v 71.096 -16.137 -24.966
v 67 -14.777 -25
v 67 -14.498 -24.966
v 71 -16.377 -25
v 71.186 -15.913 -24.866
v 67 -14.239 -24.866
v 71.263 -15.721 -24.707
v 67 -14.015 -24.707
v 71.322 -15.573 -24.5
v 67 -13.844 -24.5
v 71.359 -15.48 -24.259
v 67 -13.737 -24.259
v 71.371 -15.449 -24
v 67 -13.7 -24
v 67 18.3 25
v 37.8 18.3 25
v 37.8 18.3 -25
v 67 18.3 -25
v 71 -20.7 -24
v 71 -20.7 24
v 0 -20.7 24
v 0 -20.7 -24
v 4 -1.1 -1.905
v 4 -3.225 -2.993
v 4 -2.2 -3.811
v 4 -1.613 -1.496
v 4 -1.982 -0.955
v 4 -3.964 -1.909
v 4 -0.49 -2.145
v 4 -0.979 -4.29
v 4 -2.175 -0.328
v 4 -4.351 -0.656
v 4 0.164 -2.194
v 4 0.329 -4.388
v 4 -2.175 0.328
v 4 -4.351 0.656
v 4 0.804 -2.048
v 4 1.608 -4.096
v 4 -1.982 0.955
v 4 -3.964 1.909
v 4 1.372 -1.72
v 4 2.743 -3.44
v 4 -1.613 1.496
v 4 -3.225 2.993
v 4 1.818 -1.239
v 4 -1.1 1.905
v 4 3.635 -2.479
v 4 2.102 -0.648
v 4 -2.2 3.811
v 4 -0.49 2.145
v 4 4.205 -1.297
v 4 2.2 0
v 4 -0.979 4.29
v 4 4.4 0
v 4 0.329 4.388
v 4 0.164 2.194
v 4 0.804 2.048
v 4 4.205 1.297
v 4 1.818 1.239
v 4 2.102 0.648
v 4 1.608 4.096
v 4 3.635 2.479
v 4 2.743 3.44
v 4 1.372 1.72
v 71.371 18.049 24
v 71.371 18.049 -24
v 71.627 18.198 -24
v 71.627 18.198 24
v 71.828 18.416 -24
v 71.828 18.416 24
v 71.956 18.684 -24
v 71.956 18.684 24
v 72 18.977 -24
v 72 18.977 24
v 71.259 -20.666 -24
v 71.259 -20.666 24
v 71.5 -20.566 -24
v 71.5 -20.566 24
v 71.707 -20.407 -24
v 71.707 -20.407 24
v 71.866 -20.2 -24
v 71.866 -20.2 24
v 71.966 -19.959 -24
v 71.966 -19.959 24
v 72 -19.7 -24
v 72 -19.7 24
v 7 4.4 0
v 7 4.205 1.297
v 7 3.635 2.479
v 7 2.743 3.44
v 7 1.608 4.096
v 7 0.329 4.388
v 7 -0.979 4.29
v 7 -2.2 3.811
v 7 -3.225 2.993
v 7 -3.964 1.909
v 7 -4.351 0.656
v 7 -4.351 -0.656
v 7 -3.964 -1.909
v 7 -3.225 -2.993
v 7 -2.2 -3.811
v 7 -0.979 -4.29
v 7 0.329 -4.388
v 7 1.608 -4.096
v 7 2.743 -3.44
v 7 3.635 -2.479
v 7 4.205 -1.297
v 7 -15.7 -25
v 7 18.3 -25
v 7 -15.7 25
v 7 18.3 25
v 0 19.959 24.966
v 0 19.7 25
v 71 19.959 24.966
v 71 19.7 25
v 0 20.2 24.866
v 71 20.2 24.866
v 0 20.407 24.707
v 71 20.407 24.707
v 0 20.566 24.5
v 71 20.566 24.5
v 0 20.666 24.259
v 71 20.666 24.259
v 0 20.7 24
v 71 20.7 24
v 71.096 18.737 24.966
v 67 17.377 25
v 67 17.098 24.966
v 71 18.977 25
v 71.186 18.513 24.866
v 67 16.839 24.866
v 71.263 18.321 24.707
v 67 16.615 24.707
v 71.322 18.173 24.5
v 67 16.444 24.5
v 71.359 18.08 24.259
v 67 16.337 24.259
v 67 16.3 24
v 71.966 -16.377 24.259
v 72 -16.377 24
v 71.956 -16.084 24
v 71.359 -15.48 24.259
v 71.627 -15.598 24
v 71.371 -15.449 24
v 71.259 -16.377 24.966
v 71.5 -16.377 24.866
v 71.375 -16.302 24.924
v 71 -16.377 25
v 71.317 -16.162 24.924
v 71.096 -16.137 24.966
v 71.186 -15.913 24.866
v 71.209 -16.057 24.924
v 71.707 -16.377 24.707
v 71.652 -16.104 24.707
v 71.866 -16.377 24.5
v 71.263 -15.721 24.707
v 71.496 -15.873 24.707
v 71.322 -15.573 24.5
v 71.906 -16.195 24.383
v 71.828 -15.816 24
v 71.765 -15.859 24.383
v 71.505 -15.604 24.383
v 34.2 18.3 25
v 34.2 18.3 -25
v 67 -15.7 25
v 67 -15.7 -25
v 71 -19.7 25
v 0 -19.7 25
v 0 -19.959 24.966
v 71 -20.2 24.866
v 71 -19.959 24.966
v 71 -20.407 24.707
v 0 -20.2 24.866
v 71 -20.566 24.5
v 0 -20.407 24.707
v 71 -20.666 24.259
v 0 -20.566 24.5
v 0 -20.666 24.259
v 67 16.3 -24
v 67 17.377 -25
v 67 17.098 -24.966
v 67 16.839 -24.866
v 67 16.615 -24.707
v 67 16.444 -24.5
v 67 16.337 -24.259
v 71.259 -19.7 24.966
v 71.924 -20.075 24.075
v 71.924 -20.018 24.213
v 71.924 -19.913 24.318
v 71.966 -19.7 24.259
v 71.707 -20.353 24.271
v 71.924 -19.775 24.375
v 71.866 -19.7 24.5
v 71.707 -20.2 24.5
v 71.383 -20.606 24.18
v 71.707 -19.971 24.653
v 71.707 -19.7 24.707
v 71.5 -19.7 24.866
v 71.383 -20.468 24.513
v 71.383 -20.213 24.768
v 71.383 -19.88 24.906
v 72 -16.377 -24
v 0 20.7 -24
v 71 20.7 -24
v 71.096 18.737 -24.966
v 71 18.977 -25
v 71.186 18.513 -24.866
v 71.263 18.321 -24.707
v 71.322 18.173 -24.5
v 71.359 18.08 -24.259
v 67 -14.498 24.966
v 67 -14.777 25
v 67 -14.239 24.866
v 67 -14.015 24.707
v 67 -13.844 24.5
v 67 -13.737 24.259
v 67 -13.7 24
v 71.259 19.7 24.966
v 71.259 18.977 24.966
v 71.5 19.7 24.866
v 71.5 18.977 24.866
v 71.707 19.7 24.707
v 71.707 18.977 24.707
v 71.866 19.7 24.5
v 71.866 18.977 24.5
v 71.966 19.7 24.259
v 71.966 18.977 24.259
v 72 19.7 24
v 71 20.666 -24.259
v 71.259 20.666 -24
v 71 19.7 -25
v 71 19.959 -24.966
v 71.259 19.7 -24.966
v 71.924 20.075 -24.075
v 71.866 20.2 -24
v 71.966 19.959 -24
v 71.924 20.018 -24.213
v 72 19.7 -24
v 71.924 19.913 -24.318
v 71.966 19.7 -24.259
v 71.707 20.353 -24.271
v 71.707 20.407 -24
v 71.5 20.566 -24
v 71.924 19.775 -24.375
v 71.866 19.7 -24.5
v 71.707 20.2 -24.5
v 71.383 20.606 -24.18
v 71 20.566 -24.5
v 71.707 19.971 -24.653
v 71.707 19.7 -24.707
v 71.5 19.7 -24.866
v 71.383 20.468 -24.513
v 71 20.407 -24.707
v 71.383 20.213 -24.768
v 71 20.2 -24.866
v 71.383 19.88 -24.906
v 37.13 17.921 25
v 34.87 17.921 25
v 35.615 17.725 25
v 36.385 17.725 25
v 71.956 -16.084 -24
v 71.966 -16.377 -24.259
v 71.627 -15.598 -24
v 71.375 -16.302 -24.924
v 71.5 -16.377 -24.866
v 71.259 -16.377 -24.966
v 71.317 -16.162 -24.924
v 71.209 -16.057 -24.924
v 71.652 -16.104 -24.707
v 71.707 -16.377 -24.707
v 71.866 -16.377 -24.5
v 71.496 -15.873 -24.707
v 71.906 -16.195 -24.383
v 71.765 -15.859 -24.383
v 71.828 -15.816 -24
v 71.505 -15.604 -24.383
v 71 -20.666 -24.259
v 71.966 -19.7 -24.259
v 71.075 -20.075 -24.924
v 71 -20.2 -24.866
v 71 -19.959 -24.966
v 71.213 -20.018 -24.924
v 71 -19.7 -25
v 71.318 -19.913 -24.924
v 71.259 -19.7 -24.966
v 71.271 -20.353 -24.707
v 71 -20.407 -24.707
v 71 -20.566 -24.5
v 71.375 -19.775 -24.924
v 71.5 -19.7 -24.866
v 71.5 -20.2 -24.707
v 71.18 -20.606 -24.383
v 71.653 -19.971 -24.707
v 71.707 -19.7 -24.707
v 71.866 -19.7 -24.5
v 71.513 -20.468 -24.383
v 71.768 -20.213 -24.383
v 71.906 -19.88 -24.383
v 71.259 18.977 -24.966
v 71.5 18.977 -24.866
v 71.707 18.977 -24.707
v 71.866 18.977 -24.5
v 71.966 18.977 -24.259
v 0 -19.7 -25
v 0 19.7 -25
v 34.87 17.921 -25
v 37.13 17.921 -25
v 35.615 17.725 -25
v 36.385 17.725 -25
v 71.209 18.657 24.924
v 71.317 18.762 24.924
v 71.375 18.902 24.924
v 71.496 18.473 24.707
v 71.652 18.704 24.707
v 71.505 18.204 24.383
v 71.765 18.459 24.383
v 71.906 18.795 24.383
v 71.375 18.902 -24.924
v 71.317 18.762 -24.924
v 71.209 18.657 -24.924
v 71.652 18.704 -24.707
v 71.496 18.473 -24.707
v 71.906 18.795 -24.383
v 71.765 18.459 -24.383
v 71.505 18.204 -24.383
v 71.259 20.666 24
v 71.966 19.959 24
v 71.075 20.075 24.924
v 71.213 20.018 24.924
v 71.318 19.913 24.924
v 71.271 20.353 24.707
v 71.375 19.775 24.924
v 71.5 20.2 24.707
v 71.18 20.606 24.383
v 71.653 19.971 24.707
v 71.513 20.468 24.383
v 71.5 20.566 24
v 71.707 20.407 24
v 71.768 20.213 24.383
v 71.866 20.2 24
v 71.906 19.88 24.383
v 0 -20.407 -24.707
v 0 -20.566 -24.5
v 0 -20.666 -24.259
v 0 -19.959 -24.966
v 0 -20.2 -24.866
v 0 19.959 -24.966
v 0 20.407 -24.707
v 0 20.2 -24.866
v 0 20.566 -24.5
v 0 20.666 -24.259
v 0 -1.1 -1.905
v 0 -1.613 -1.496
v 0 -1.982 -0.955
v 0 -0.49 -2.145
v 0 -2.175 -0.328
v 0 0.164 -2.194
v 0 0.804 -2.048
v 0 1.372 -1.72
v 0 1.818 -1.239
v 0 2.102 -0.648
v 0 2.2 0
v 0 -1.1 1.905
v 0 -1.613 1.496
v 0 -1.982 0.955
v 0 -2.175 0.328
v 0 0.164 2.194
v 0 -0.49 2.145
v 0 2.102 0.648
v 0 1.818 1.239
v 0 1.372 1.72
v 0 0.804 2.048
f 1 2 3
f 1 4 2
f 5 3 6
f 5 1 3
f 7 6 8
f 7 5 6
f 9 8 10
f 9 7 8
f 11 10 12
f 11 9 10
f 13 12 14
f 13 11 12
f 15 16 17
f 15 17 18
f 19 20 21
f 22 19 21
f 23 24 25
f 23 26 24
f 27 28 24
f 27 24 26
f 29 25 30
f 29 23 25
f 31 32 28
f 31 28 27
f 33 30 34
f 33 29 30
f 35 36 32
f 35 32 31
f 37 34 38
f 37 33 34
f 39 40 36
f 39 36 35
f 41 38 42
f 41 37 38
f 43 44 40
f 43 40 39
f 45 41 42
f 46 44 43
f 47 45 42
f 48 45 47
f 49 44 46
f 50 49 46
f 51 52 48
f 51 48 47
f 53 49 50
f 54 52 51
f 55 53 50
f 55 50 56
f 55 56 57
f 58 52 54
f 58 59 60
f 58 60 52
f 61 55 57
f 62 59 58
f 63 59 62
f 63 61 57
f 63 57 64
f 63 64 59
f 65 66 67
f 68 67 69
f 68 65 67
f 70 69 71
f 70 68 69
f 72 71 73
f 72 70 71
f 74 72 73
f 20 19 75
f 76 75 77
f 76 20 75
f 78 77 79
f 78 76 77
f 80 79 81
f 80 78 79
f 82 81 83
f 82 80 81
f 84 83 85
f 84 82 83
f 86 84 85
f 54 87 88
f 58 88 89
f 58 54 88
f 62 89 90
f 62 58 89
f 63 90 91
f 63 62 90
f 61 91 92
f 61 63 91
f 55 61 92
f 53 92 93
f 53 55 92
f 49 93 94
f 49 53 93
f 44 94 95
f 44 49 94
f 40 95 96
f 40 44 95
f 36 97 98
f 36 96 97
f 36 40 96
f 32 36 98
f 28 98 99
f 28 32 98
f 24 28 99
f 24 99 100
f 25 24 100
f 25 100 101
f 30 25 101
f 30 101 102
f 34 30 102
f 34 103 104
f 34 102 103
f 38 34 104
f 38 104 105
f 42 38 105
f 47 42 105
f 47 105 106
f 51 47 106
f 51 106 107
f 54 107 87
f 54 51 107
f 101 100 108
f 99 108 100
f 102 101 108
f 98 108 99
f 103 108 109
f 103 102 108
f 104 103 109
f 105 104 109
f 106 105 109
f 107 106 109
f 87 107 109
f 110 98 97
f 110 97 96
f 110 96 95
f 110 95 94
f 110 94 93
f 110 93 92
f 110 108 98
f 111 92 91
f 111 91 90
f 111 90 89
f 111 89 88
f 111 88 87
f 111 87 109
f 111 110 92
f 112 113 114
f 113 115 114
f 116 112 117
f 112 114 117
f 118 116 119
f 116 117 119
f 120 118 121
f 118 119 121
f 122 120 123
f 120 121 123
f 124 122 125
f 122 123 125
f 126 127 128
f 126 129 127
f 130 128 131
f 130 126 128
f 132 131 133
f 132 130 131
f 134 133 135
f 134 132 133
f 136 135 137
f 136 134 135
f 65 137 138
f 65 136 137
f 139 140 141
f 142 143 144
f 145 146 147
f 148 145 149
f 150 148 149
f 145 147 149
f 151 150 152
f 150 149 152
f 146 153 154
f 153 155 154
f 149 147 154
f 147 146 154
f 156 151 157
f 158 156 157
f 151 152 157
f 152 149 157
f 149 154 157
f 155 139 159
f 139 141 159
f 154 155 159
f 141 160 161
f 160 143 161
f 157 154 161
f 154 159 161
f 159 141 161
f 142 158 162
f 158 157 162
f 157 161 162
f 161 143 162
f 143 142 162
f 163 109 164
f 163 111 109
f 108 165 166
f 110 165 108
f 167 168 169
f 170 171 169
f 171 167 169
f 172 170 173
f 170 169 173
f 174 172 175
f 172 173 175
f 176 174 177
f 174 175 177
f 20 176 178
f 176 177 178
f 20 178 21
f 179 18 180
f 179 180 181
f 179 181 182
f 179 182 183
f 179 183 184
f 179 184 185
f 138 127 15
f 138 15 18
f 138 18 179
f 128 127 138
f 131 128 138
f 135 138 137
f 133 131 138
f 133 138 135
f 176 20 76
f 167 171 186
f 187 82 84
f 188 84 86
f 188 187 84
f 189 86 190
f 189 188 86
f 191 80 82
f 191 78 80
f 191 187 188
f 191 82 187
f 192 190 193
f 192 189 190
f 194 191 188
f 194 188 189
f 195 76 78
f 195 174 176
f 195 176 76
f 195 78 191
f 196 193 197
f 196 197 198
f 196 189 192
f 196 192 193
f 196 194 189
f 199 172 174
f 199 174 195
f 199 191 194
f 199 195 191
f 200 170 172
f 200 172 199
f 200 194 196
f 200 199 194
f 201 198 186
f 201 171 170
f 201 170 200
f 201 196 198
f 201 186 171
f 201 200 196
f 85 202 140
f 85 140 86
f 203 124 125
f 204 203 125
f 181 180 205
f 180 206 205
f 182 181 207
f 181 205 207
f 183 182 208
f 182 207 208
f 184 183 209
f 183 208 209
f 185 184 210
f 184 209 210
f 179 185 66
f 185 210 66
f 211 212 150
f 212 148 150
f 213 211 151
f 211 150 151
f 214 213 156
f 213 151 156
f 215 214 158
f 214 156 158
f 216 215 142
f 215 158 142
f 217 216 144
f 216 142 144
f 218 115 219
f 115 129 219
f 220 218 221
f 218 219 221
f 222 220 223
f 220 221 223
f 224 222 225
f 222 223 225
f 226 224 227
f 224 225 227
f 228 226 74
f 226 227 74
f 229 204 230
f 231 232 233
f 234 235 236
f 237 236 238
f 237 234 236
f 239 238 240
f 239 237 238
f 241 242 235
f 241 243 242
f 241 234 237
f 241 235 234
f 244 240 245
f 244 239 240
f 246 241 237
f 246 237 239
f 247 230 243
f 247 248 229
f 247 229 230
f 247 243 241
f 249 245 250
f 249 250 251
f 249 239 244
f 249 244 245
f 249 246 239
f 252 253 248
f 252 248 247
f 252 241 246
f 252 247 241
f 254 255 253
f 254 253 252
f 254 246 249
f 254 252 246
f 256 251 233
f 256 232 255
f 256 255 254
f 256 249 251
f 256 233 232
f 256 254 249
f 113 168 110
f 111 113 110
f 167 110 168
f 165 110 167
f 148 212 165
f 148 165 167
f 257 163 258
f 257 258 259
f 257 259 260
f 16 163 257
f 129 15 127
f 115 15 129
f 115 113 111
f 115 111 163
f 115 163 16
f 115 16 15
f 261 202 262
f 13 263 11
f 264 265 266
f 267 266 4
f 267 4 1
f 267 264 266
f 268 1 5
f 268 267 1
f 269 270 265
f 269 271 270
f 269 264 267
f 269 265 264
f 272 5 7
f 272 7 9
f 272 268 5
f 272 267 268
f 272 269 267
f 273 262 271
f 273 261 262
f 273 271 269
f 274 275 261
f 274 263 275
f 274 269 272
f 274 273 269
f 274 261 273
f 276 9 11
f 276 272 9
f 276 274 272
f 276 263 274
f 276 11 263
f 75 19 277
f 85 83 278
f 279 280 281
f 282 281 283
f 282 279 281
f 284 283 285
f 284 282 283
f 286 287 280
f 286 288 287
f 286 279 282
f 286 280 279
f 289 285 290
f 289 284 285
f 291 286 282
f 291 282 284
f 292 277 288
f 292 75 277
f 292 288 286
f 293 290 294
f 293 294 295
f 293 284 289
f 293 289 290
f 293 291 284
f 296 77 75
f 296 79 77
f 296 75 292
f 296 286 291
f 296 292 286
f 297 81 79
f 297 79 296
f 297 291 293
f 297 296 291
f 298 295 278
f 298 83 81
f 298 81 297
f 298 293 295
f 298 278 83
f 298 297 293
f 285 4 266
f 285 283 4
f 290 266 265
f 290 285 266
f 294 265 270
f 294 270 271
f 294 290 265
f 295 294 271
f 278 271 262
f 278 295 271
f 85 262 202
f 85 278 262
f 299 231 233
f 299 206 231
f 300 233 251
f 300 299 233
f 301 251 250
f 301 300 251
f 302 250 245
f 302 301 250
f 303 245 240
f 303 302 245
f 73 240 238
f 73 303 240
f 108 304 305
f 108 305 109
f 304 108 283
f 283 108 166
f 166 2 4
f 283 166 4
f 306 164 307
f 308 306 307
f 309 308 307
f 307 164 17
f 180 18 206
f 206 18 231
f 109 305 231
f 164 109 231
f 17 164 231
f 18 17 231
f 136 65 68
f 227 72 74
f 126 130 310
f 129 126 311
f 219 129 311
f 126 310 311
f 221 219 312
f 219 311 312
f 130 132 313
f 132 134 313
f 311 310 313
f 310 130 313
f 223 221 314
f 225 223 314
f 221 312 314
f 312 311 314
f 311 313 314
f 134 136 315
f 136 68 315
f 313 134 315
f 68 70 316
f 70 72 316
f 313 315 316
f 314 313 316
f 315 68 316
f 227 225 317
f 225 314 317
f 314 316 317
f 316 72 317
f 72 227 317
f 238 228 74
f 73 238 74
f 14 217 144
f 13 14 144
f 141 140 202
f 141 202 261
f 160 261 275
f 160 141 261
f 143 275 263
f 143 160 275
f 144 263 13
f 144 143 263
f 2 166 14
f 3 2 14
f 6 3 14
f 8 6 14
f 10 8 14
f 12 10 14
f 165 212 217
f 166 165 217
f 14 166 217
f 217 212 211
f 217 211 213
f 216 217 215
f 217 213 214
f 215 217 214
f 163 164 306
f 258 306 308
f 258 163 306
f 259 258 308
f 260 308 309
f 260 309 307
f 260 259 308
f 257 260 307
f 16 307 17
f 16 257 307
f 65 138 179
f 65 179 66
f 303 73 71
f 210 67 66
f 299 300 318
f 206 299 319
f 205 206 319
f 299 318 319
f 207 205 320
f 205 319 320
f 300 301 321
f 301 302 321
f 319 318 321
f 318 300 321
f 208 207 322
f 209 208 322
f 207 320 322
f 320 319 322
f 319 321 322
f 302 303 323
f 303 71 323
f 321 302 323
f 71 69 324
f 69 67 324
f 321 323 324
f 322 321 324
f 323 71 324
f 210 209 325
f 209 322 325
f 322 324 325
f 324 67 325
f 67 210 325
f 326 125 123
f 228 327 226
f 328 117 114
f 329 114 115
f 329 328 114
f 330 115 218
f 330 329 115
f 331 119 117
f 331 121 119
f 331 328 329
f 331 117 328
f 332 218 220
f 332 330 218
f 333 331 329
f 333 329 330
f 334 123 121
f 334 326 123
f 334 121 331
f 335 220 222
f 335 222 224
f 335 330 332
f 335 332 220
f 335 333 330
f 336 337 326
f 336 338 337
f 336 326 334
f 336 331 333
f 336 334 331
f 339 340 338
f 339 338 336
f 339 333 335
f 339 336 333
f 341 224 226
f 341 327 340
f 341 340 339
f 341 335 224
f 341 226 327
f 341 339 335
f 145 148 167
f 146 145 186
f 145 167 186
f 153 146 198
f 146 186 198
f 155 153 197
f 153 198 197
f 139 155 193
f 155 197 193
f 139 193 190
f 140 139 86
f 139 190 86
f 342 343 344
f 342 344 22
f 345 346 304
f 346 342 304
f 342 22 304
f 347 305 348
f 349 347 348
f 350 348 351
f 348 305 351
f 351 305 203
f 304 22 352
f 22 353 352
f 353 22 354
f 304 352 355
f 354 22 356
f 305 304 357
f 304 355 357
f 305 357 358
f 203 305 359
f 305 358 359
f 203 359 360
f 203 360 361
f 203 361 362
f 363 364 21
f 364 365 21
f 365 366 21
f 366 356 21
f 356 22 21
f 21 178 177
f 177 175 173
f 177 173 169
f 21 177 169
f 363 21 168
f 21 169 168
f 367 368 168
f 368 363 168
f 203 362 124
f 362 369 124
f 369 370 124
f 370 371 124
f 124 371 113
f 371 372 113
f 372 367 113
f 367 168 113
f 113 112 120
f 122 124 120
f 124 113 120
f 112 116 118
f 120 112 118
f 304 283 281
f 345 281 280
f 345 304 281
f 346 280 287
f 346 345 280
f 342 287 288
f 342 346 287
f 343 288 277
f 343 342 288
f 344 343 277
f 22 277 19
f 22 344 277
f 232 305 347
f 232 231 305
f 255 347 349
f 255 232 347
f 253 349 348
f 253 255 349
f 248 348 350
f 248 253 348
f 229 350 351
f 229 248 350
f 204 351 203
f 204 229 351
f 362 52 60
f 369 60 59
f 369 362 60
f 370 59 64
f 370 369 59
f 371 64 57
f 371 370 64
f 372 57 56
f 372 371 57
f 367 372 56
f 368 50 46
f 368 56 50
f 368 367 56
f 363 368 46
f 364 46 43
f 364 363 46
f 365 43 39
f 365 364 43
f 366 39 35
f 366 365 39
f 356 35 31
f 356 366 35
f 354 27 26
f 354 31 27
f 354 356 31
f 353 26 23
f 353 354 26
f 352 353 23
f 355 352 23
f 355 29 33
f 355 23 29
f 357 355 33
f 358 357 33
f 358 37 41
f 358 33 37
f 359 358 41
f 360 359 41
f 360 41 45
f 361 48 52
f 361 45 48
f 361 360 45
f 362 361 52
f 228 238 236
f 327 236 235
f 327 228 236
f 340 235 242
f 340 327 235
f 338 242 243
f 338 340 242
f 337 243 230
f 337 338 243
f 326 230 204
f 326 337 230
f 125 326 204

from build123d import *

# Parameters (mm, degrees)
PAD005_DEPTH    = 25
SKETCH012_R     = 2.2
POCKET005_DEPTH = 72.001
SKETCH013_R     = 4.4
POCKET006_DEPTH = 68.001
FILLET003_R     = 1


with BuildPart() as part:
    # Sketch011 → Pad005 (new body, symmetric)
    with BuildSketch(Plane.XY):
        with BuildLine():
            Line((7, 18.3), (34.2, 18.3))
            ThreePointArc((34.2, 18.3), (36, 17.7), (37.8, 18.3))
            Line((37.8, 18.3), (67, 18.3))
            Line((67, 18.3), (67, 16.3))
            Line((67, 16.3), (72, 18.3))
            Line((72, 20.7), (72, 18.3))
            Line((0, 20.7), (72, 20.7))
            Line((0, -20.7), (0, 20.7))
            Line((72, -20.7), (0, -20.7))
            Line((72, -15.7), (72, -20.7))
            Line((67, -13.7), (72, -15.7))
            Line((67, -15.7), (67, -13.7))
            Line((67, -15.7), (7, -15.7))
            Line((7, -15.7), (7, 18.3))
        make_face()
    extrude(amount=PAD005_DEPTH, both=True)

    # Sketch012 → Pocket005 (cut, through all)
    with BuildSketch(Plane.YZ):
        Circle(SKETCH012_R)
    extrude(amount=POCKET005_DEPTH, mode=Mode.SUBTRACT)

    # Sketch013 → Pocket006 (cut, through all)
    with BuildSketch(Plane.YZ.offset(4)):
        Circle(SKETCH013_R)
    extrude(amount=POCKET006_DEPTH, mode=Mode.SUBTRACT)

    # Fillet003
    fillet003_edges = [part.edges().sort_by_distance(p)[0] for p in [
        (36, 20.7, -25),
        (72, 20.7, 0),
        (36, 20.7, 25),
        (36, -20.7, 25),
        (72, -20.7, 0),
        (36, -20.7, -25),
        (72, -15.7, 0),
        (72, 18.3, 0),
        (72, 19.5, -25),
        (72, -18.2, -25),
        (69.5, -14.7, -25),
        (72, -18.2, 25),
        (69.5, 17.3, -25),
        (69.5, 17.3, 25),
        (72, 19.5, 25),
        (69.5, -14.7, 25),
    ]]
    fillet(fillet003_edges, radius=FILLET003_R)


solid = part.part
